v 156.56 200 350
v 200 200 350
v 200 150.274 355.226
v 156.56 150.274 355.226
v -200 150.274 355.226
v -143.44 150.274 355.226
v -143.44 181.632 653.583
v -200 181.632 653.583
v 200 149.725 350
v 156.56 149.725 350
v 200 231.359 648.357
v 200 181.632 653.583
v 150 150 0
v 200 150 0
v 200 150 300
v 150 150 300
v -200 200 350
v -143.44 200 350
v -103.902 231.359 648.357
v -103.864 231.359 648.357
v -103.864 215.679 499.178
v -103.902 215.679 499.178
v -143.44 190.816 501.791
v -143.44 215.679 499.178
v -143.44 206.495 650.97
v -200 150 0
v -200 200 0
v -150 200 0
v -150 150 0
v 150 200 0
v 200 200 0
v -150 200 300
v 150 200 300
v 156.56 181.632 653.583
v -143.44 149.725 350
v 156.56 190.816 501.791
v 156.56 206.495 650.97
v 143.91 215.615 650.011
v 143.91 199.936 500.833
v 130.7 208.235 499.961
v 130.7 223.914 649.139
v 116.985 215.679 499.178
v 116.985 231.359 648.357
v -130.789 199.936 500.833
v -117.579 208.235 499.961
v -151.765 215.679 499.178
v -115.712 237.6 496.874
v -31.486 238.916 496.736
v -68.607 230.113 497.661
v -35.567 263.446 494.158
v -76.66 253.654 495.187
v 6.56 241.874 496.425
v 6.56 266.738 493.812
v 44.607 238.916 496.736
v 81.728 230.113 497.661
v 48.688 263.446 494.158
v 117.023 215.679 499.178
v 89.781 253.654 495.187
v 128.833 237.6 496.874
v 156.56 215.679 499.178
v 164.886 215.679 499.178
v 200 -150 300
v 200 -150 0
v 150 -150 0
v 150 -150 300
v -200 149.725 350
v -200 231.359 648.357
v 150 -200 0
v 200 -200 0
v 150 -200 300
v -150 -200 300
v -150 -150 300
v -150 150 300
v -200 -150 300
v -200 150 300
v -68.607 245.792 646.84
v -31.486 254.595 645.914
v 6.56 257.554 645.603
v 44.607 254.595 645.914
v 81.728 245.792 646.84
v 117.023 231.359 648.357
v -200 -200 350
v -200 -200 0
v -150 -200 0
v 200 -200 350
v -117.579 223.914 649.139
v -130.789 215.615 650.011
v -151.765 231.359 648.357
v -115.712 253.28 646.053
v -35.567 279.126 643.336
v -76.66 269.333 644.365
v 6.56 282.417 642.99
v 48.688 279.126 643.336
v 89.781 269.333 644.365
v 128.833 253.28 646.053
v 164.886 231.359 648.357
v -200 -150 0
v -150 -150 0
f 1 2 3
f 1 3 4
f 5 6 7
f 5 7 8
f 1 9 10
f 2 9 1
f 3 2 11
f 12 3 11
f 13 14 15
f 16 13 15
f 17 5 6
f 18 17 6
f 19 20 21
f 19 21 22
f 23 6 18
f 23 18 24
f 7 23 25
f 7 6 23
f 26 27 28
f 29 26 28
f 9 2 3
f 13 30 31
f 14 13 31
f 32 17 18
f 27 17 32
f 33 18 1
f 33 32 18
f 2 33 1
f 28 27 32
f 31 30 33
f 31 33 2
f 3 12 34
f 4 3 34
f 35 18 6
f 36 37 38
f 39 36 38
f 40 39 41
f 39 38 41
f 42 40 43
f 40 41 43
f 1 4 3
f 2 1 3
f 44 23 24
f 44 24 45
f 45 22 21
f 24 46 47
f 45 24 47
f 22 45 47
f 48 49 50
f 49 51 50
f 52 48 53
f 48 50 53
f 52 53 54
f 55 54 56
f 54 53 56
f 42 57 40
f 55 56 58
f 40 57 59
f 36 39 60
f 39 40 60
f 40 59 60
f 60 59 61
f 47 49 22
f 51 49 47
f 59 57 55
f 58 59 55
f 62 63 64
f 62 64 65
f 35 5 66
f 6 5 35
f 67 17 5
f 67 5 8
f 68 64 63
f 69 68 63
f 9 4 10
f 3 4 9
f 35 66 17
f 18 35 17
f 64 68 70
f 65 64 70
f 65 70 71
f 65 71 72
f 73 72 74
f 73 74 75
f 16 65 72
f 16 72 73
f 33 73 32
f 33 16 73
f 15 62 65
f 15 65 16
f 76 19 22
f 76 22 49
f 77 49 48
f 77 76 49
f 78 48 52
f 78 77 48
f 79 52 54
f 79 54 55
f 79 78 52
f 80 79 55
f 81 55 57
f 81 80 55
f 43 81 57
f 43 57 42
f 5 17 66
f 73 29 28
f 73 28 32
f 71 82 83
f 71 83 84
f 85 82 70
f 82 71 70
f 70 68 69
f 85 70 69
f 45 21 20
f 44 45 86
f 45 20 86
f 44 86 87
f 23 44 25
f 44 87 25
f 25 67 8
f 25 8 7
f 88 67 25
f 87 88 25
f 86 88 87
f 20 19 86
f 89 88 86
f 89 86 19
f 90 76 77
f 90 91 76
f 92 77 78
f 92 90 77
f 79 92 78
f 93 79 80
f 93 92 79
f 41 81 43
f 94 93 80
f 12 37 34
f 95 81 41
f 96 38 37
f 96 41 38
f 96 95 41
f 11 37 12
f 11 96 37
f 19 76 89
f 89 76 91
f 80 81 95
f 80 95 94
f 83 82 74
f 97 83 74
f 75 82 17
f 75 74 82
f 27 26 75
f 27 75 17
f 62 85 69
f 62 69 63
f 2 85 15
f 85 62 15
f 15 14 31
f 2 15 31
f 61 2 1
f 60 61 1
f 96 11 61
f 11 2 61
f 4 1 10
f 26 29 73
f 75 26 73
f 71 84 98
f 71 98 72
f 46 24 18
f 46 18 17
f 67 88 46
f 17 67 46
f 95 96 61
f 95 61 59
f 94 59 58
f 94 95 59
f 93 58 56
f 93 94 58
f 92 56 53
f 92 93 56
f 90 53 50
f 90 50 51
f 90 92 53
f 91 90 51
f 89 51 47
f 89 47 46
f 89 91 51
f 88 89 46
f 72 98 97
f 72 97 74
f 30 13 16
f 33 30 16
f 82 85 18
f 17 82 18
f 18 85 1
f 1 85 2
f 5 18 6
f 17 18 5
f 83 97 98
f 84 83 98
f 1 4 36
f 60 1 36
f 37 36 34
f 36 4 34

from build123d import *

# Parameters (mm, degrees)
F0_W         = 400
F0_H         = 400
F1_DEPTH     = 350
F2_W         = 150
F2_H         = 300
F3_DEPTH     = 523
F4_W         = 150
F4_H         = 300
F5_DEPTH     = 523
F6_W         = 150
F6_H         = 300
F7_DEPTH     = 603
F8_W         = 50
F8_H         = 400
F9_DEPTH     = 300
F10_DEPTH    = 260
F15_W        = 400
F15_H        = 300
F16_DEPTH    = 50
F17_W        = 300
F17_H        = 300
F18_DEPTH    = 138
F19_W        = 150
F19_H        = 300
F20_DEPTH    = 431.3595389803
F21_W        = 300
F21_H        = 150
F22_DEPTH    = 117.7727157663
F22_FACE_W   = 56.5604969859
F22_FACE_H   = 50
F22_FACE_W_2 = 43.4395030141
F24_DEPTH    = 25
F26_DEPTH    = 150
F28_DEPTH    = 150


with BuildPart() as f1:
    # F0 (on Top) → F1 (new body)
    with BuildSketch(Plane.XY):
        Rectangle(F0_W, F0_H)
    extrude(amount=F1_DEPTH)

    # F2 (on face) → F3 (cut)
    with BuildSketch(Plane.YZ.offset(200)):
        with Locations((-75, 150)):
            Rectangle(F2_W, F2_H)
    extrude(amount=-F3_DEPTH, mode=Mode.SUBTRACT)

    # F4 (on face) → F5 (cut)
    with BuildSketch(Plane.YZ.offset(200)):
        with Locations((75, 150)):
            Rectangle(F4_W, F4_H)
    extrude(amount=-F5_DEPTH, mode=Mode.SUBTRACT)

    # F6 (on face) → F7 (cut)
    with BuildSketch(Plane.XZ.offset(200)):
        with Locations((-75, 150)):
            Rectangle(F6_W, F6_H)
    extrude(amount=-F7_DEPTH, mode=Mode.SUBTRACT)

    # F8 (on face) → F9 (join)
    with BuildSketch(Plane.XY.offset(350)):
        with Locations((-175, 0)):
            Rectangle(F8_W, F8_H)
    extrude(amount=F9_DEPTH)

    # F10 (cut): a face of the model
    f10_faces = [f1.faces().sort_by_distance(p)[0] for p in [
        (-150, 0, 500),
    ]]
    extrude(f10_faces, amount=-F10_DEPTH, mode=Mode.SUBTRACT)

    # F15 (on line) → F16 (join)
    with BuildSketch(Plane(origin=(0, 161.4302141803, -16.9669992102), x_dir=(-1, 0, 0), z_dir=(0, 0.9945218954, -0.1045284633))):
        with Locations((0, 518.9883560324)):
            Rectangle(F15_W, F15_H)
    extrude(amount=-F16_DEPTH)

    # F17 (on face) → F18 (cut)
    with BuildSketch(Plane(origin=(0, 111.7041194119, -11.7405760468), x_dir=(1, 0, 0), z_dir=(0, -0.9945218954, 0.1045284633))):
        with Locations((6.5604969859, 518.9883560324)):
            Rectangle(F17_W, F17_H)
    extrude(amount=F18_DEPTH, mode=Mode.SUBTRACT)

    # F19 (on face) → F20 (cut, through all)
    with BuildSketch(Plane.XZ.offset(200)):
        with Locations((75, 150)):
            Rectangle(F19_W, F19_H)
    extrude(amount=-F20_DEPTH, mode=Mode.SUBTRACT)

    # F21 (on face) → F22 (cut, through all)
    with BuildSketch(Plane(origin=(0, 111.7041194119, -11.7405760468), x_dir=(1, 0, 0), z_dir=(0, -0.9945218954, 0.1045284633))):
        with Locations((6.5604969859, 443.9883560324)):
            Rectangle(F21_W, F21_H)
    extrude(amount=-F22_DEPTH, mode=Mode.SUBTRACT)


with BuildPart() as f23:
    # F22_face (on face) → F23 (new body, up to the next surface of F1)
    with BuildSketch(Plane(origin=(-171.719751507, 175.1369526158, 352.6132115817), x_dir=(1, 0, 0), z_dir=(0, -0.1045284633, -0.9945218954))):
        Rectangle(F22_FACE_W, F22_FACE_H)
    extrude(until=Until.NEXT, target=f1.part)


with BuildPart() as f23b:
    # F22_face (on face) → F23, piece 2 (new body, up to the next surface of F1)
    with BuildSketch(Plane(origin=(-171.719751507, 175.1369526158, 352.6132115817), x_dir=(1, 0, 0), z_dir=(0, -0.1045284633, -0.9945218954))):
        with Locations((350, 0)):
            Rectangle(F22_FACE_W_2, F22_FACE_H)
    extrude(until=Until.NEXT, target=f1.part)


with BuildPart() as f1_1:
    add(f1.part)

    # F17 (on face) → F24 (cut)
    with BuildSketch(Plane(origin=(0, 111.7041194119, -11.7405760468), x_dir=(1, 0, 0), z_dir=(0, -0.9945218954, 0.1045284633))):
        with Locations((6.5604969859, 518.9883560324)):
            Rectangle(F17_W, F17_H)
    extrude(amount=-F24_DEPTH, mode=Mode.SUBTRACT)

    # F25 (on face) → F26 (join)
    with BuildSketch(Plane(origin=(0, 69.9283248, 665.3235678207), x_dir=(1, 0, 0), z_dir=(0, 0.1045284633, 0.9945218954))):
        with BuildLine():
            ThreePointArc((-103.9022000101, 162.31941693), (6.5604969859, 188.6588998813), (117.0231939819, 162.31941693))
            Line((117.0231939819, 162.31941693), (164.8860291896, 162.31941693))
            ThreePointArc((164.8860291896, 162.31941693), (6.5604969859, 213.6588998813), (-151.7650352177, 162.31941693))
            Line((-151.7650352177, 162.31941693), (-103.9022000101, 162.31941693))
        make_face()
    extrude(amount=-F26_DEPTH)

    # F27 (on face) → F28 (cut)
    with BuildSketch(Plane(origin=(0, 69.9283248, 665.3235678207), x_dir=(1, 0, 0), z_dir=(0, 0.1045284633, 0.9945218954))):
        with BuildLine():
            Line((-143.4395030141, 137.31941693), (156.5604969859, 137.31941693))
            ThreePointArc((156.5604969859, 137.31941693), (137.3712712446, 150.7670267438), (116.9848327318, 162.31941693))
            Line((116.9848327318, 162.31941693), (-103.86383876, 162.31941693))
            ThreePointArc((-103.86383876, 162.31941693), (-124.2502772728, 150.7670267438), (-143.4395030141, 137.31941693))
        make_face()
    extrude(amount=-F28_DEPTH, mode=Mode.SUBTRACT)


solid = Compound([f23.part, f23b.part, f1_1.part])
